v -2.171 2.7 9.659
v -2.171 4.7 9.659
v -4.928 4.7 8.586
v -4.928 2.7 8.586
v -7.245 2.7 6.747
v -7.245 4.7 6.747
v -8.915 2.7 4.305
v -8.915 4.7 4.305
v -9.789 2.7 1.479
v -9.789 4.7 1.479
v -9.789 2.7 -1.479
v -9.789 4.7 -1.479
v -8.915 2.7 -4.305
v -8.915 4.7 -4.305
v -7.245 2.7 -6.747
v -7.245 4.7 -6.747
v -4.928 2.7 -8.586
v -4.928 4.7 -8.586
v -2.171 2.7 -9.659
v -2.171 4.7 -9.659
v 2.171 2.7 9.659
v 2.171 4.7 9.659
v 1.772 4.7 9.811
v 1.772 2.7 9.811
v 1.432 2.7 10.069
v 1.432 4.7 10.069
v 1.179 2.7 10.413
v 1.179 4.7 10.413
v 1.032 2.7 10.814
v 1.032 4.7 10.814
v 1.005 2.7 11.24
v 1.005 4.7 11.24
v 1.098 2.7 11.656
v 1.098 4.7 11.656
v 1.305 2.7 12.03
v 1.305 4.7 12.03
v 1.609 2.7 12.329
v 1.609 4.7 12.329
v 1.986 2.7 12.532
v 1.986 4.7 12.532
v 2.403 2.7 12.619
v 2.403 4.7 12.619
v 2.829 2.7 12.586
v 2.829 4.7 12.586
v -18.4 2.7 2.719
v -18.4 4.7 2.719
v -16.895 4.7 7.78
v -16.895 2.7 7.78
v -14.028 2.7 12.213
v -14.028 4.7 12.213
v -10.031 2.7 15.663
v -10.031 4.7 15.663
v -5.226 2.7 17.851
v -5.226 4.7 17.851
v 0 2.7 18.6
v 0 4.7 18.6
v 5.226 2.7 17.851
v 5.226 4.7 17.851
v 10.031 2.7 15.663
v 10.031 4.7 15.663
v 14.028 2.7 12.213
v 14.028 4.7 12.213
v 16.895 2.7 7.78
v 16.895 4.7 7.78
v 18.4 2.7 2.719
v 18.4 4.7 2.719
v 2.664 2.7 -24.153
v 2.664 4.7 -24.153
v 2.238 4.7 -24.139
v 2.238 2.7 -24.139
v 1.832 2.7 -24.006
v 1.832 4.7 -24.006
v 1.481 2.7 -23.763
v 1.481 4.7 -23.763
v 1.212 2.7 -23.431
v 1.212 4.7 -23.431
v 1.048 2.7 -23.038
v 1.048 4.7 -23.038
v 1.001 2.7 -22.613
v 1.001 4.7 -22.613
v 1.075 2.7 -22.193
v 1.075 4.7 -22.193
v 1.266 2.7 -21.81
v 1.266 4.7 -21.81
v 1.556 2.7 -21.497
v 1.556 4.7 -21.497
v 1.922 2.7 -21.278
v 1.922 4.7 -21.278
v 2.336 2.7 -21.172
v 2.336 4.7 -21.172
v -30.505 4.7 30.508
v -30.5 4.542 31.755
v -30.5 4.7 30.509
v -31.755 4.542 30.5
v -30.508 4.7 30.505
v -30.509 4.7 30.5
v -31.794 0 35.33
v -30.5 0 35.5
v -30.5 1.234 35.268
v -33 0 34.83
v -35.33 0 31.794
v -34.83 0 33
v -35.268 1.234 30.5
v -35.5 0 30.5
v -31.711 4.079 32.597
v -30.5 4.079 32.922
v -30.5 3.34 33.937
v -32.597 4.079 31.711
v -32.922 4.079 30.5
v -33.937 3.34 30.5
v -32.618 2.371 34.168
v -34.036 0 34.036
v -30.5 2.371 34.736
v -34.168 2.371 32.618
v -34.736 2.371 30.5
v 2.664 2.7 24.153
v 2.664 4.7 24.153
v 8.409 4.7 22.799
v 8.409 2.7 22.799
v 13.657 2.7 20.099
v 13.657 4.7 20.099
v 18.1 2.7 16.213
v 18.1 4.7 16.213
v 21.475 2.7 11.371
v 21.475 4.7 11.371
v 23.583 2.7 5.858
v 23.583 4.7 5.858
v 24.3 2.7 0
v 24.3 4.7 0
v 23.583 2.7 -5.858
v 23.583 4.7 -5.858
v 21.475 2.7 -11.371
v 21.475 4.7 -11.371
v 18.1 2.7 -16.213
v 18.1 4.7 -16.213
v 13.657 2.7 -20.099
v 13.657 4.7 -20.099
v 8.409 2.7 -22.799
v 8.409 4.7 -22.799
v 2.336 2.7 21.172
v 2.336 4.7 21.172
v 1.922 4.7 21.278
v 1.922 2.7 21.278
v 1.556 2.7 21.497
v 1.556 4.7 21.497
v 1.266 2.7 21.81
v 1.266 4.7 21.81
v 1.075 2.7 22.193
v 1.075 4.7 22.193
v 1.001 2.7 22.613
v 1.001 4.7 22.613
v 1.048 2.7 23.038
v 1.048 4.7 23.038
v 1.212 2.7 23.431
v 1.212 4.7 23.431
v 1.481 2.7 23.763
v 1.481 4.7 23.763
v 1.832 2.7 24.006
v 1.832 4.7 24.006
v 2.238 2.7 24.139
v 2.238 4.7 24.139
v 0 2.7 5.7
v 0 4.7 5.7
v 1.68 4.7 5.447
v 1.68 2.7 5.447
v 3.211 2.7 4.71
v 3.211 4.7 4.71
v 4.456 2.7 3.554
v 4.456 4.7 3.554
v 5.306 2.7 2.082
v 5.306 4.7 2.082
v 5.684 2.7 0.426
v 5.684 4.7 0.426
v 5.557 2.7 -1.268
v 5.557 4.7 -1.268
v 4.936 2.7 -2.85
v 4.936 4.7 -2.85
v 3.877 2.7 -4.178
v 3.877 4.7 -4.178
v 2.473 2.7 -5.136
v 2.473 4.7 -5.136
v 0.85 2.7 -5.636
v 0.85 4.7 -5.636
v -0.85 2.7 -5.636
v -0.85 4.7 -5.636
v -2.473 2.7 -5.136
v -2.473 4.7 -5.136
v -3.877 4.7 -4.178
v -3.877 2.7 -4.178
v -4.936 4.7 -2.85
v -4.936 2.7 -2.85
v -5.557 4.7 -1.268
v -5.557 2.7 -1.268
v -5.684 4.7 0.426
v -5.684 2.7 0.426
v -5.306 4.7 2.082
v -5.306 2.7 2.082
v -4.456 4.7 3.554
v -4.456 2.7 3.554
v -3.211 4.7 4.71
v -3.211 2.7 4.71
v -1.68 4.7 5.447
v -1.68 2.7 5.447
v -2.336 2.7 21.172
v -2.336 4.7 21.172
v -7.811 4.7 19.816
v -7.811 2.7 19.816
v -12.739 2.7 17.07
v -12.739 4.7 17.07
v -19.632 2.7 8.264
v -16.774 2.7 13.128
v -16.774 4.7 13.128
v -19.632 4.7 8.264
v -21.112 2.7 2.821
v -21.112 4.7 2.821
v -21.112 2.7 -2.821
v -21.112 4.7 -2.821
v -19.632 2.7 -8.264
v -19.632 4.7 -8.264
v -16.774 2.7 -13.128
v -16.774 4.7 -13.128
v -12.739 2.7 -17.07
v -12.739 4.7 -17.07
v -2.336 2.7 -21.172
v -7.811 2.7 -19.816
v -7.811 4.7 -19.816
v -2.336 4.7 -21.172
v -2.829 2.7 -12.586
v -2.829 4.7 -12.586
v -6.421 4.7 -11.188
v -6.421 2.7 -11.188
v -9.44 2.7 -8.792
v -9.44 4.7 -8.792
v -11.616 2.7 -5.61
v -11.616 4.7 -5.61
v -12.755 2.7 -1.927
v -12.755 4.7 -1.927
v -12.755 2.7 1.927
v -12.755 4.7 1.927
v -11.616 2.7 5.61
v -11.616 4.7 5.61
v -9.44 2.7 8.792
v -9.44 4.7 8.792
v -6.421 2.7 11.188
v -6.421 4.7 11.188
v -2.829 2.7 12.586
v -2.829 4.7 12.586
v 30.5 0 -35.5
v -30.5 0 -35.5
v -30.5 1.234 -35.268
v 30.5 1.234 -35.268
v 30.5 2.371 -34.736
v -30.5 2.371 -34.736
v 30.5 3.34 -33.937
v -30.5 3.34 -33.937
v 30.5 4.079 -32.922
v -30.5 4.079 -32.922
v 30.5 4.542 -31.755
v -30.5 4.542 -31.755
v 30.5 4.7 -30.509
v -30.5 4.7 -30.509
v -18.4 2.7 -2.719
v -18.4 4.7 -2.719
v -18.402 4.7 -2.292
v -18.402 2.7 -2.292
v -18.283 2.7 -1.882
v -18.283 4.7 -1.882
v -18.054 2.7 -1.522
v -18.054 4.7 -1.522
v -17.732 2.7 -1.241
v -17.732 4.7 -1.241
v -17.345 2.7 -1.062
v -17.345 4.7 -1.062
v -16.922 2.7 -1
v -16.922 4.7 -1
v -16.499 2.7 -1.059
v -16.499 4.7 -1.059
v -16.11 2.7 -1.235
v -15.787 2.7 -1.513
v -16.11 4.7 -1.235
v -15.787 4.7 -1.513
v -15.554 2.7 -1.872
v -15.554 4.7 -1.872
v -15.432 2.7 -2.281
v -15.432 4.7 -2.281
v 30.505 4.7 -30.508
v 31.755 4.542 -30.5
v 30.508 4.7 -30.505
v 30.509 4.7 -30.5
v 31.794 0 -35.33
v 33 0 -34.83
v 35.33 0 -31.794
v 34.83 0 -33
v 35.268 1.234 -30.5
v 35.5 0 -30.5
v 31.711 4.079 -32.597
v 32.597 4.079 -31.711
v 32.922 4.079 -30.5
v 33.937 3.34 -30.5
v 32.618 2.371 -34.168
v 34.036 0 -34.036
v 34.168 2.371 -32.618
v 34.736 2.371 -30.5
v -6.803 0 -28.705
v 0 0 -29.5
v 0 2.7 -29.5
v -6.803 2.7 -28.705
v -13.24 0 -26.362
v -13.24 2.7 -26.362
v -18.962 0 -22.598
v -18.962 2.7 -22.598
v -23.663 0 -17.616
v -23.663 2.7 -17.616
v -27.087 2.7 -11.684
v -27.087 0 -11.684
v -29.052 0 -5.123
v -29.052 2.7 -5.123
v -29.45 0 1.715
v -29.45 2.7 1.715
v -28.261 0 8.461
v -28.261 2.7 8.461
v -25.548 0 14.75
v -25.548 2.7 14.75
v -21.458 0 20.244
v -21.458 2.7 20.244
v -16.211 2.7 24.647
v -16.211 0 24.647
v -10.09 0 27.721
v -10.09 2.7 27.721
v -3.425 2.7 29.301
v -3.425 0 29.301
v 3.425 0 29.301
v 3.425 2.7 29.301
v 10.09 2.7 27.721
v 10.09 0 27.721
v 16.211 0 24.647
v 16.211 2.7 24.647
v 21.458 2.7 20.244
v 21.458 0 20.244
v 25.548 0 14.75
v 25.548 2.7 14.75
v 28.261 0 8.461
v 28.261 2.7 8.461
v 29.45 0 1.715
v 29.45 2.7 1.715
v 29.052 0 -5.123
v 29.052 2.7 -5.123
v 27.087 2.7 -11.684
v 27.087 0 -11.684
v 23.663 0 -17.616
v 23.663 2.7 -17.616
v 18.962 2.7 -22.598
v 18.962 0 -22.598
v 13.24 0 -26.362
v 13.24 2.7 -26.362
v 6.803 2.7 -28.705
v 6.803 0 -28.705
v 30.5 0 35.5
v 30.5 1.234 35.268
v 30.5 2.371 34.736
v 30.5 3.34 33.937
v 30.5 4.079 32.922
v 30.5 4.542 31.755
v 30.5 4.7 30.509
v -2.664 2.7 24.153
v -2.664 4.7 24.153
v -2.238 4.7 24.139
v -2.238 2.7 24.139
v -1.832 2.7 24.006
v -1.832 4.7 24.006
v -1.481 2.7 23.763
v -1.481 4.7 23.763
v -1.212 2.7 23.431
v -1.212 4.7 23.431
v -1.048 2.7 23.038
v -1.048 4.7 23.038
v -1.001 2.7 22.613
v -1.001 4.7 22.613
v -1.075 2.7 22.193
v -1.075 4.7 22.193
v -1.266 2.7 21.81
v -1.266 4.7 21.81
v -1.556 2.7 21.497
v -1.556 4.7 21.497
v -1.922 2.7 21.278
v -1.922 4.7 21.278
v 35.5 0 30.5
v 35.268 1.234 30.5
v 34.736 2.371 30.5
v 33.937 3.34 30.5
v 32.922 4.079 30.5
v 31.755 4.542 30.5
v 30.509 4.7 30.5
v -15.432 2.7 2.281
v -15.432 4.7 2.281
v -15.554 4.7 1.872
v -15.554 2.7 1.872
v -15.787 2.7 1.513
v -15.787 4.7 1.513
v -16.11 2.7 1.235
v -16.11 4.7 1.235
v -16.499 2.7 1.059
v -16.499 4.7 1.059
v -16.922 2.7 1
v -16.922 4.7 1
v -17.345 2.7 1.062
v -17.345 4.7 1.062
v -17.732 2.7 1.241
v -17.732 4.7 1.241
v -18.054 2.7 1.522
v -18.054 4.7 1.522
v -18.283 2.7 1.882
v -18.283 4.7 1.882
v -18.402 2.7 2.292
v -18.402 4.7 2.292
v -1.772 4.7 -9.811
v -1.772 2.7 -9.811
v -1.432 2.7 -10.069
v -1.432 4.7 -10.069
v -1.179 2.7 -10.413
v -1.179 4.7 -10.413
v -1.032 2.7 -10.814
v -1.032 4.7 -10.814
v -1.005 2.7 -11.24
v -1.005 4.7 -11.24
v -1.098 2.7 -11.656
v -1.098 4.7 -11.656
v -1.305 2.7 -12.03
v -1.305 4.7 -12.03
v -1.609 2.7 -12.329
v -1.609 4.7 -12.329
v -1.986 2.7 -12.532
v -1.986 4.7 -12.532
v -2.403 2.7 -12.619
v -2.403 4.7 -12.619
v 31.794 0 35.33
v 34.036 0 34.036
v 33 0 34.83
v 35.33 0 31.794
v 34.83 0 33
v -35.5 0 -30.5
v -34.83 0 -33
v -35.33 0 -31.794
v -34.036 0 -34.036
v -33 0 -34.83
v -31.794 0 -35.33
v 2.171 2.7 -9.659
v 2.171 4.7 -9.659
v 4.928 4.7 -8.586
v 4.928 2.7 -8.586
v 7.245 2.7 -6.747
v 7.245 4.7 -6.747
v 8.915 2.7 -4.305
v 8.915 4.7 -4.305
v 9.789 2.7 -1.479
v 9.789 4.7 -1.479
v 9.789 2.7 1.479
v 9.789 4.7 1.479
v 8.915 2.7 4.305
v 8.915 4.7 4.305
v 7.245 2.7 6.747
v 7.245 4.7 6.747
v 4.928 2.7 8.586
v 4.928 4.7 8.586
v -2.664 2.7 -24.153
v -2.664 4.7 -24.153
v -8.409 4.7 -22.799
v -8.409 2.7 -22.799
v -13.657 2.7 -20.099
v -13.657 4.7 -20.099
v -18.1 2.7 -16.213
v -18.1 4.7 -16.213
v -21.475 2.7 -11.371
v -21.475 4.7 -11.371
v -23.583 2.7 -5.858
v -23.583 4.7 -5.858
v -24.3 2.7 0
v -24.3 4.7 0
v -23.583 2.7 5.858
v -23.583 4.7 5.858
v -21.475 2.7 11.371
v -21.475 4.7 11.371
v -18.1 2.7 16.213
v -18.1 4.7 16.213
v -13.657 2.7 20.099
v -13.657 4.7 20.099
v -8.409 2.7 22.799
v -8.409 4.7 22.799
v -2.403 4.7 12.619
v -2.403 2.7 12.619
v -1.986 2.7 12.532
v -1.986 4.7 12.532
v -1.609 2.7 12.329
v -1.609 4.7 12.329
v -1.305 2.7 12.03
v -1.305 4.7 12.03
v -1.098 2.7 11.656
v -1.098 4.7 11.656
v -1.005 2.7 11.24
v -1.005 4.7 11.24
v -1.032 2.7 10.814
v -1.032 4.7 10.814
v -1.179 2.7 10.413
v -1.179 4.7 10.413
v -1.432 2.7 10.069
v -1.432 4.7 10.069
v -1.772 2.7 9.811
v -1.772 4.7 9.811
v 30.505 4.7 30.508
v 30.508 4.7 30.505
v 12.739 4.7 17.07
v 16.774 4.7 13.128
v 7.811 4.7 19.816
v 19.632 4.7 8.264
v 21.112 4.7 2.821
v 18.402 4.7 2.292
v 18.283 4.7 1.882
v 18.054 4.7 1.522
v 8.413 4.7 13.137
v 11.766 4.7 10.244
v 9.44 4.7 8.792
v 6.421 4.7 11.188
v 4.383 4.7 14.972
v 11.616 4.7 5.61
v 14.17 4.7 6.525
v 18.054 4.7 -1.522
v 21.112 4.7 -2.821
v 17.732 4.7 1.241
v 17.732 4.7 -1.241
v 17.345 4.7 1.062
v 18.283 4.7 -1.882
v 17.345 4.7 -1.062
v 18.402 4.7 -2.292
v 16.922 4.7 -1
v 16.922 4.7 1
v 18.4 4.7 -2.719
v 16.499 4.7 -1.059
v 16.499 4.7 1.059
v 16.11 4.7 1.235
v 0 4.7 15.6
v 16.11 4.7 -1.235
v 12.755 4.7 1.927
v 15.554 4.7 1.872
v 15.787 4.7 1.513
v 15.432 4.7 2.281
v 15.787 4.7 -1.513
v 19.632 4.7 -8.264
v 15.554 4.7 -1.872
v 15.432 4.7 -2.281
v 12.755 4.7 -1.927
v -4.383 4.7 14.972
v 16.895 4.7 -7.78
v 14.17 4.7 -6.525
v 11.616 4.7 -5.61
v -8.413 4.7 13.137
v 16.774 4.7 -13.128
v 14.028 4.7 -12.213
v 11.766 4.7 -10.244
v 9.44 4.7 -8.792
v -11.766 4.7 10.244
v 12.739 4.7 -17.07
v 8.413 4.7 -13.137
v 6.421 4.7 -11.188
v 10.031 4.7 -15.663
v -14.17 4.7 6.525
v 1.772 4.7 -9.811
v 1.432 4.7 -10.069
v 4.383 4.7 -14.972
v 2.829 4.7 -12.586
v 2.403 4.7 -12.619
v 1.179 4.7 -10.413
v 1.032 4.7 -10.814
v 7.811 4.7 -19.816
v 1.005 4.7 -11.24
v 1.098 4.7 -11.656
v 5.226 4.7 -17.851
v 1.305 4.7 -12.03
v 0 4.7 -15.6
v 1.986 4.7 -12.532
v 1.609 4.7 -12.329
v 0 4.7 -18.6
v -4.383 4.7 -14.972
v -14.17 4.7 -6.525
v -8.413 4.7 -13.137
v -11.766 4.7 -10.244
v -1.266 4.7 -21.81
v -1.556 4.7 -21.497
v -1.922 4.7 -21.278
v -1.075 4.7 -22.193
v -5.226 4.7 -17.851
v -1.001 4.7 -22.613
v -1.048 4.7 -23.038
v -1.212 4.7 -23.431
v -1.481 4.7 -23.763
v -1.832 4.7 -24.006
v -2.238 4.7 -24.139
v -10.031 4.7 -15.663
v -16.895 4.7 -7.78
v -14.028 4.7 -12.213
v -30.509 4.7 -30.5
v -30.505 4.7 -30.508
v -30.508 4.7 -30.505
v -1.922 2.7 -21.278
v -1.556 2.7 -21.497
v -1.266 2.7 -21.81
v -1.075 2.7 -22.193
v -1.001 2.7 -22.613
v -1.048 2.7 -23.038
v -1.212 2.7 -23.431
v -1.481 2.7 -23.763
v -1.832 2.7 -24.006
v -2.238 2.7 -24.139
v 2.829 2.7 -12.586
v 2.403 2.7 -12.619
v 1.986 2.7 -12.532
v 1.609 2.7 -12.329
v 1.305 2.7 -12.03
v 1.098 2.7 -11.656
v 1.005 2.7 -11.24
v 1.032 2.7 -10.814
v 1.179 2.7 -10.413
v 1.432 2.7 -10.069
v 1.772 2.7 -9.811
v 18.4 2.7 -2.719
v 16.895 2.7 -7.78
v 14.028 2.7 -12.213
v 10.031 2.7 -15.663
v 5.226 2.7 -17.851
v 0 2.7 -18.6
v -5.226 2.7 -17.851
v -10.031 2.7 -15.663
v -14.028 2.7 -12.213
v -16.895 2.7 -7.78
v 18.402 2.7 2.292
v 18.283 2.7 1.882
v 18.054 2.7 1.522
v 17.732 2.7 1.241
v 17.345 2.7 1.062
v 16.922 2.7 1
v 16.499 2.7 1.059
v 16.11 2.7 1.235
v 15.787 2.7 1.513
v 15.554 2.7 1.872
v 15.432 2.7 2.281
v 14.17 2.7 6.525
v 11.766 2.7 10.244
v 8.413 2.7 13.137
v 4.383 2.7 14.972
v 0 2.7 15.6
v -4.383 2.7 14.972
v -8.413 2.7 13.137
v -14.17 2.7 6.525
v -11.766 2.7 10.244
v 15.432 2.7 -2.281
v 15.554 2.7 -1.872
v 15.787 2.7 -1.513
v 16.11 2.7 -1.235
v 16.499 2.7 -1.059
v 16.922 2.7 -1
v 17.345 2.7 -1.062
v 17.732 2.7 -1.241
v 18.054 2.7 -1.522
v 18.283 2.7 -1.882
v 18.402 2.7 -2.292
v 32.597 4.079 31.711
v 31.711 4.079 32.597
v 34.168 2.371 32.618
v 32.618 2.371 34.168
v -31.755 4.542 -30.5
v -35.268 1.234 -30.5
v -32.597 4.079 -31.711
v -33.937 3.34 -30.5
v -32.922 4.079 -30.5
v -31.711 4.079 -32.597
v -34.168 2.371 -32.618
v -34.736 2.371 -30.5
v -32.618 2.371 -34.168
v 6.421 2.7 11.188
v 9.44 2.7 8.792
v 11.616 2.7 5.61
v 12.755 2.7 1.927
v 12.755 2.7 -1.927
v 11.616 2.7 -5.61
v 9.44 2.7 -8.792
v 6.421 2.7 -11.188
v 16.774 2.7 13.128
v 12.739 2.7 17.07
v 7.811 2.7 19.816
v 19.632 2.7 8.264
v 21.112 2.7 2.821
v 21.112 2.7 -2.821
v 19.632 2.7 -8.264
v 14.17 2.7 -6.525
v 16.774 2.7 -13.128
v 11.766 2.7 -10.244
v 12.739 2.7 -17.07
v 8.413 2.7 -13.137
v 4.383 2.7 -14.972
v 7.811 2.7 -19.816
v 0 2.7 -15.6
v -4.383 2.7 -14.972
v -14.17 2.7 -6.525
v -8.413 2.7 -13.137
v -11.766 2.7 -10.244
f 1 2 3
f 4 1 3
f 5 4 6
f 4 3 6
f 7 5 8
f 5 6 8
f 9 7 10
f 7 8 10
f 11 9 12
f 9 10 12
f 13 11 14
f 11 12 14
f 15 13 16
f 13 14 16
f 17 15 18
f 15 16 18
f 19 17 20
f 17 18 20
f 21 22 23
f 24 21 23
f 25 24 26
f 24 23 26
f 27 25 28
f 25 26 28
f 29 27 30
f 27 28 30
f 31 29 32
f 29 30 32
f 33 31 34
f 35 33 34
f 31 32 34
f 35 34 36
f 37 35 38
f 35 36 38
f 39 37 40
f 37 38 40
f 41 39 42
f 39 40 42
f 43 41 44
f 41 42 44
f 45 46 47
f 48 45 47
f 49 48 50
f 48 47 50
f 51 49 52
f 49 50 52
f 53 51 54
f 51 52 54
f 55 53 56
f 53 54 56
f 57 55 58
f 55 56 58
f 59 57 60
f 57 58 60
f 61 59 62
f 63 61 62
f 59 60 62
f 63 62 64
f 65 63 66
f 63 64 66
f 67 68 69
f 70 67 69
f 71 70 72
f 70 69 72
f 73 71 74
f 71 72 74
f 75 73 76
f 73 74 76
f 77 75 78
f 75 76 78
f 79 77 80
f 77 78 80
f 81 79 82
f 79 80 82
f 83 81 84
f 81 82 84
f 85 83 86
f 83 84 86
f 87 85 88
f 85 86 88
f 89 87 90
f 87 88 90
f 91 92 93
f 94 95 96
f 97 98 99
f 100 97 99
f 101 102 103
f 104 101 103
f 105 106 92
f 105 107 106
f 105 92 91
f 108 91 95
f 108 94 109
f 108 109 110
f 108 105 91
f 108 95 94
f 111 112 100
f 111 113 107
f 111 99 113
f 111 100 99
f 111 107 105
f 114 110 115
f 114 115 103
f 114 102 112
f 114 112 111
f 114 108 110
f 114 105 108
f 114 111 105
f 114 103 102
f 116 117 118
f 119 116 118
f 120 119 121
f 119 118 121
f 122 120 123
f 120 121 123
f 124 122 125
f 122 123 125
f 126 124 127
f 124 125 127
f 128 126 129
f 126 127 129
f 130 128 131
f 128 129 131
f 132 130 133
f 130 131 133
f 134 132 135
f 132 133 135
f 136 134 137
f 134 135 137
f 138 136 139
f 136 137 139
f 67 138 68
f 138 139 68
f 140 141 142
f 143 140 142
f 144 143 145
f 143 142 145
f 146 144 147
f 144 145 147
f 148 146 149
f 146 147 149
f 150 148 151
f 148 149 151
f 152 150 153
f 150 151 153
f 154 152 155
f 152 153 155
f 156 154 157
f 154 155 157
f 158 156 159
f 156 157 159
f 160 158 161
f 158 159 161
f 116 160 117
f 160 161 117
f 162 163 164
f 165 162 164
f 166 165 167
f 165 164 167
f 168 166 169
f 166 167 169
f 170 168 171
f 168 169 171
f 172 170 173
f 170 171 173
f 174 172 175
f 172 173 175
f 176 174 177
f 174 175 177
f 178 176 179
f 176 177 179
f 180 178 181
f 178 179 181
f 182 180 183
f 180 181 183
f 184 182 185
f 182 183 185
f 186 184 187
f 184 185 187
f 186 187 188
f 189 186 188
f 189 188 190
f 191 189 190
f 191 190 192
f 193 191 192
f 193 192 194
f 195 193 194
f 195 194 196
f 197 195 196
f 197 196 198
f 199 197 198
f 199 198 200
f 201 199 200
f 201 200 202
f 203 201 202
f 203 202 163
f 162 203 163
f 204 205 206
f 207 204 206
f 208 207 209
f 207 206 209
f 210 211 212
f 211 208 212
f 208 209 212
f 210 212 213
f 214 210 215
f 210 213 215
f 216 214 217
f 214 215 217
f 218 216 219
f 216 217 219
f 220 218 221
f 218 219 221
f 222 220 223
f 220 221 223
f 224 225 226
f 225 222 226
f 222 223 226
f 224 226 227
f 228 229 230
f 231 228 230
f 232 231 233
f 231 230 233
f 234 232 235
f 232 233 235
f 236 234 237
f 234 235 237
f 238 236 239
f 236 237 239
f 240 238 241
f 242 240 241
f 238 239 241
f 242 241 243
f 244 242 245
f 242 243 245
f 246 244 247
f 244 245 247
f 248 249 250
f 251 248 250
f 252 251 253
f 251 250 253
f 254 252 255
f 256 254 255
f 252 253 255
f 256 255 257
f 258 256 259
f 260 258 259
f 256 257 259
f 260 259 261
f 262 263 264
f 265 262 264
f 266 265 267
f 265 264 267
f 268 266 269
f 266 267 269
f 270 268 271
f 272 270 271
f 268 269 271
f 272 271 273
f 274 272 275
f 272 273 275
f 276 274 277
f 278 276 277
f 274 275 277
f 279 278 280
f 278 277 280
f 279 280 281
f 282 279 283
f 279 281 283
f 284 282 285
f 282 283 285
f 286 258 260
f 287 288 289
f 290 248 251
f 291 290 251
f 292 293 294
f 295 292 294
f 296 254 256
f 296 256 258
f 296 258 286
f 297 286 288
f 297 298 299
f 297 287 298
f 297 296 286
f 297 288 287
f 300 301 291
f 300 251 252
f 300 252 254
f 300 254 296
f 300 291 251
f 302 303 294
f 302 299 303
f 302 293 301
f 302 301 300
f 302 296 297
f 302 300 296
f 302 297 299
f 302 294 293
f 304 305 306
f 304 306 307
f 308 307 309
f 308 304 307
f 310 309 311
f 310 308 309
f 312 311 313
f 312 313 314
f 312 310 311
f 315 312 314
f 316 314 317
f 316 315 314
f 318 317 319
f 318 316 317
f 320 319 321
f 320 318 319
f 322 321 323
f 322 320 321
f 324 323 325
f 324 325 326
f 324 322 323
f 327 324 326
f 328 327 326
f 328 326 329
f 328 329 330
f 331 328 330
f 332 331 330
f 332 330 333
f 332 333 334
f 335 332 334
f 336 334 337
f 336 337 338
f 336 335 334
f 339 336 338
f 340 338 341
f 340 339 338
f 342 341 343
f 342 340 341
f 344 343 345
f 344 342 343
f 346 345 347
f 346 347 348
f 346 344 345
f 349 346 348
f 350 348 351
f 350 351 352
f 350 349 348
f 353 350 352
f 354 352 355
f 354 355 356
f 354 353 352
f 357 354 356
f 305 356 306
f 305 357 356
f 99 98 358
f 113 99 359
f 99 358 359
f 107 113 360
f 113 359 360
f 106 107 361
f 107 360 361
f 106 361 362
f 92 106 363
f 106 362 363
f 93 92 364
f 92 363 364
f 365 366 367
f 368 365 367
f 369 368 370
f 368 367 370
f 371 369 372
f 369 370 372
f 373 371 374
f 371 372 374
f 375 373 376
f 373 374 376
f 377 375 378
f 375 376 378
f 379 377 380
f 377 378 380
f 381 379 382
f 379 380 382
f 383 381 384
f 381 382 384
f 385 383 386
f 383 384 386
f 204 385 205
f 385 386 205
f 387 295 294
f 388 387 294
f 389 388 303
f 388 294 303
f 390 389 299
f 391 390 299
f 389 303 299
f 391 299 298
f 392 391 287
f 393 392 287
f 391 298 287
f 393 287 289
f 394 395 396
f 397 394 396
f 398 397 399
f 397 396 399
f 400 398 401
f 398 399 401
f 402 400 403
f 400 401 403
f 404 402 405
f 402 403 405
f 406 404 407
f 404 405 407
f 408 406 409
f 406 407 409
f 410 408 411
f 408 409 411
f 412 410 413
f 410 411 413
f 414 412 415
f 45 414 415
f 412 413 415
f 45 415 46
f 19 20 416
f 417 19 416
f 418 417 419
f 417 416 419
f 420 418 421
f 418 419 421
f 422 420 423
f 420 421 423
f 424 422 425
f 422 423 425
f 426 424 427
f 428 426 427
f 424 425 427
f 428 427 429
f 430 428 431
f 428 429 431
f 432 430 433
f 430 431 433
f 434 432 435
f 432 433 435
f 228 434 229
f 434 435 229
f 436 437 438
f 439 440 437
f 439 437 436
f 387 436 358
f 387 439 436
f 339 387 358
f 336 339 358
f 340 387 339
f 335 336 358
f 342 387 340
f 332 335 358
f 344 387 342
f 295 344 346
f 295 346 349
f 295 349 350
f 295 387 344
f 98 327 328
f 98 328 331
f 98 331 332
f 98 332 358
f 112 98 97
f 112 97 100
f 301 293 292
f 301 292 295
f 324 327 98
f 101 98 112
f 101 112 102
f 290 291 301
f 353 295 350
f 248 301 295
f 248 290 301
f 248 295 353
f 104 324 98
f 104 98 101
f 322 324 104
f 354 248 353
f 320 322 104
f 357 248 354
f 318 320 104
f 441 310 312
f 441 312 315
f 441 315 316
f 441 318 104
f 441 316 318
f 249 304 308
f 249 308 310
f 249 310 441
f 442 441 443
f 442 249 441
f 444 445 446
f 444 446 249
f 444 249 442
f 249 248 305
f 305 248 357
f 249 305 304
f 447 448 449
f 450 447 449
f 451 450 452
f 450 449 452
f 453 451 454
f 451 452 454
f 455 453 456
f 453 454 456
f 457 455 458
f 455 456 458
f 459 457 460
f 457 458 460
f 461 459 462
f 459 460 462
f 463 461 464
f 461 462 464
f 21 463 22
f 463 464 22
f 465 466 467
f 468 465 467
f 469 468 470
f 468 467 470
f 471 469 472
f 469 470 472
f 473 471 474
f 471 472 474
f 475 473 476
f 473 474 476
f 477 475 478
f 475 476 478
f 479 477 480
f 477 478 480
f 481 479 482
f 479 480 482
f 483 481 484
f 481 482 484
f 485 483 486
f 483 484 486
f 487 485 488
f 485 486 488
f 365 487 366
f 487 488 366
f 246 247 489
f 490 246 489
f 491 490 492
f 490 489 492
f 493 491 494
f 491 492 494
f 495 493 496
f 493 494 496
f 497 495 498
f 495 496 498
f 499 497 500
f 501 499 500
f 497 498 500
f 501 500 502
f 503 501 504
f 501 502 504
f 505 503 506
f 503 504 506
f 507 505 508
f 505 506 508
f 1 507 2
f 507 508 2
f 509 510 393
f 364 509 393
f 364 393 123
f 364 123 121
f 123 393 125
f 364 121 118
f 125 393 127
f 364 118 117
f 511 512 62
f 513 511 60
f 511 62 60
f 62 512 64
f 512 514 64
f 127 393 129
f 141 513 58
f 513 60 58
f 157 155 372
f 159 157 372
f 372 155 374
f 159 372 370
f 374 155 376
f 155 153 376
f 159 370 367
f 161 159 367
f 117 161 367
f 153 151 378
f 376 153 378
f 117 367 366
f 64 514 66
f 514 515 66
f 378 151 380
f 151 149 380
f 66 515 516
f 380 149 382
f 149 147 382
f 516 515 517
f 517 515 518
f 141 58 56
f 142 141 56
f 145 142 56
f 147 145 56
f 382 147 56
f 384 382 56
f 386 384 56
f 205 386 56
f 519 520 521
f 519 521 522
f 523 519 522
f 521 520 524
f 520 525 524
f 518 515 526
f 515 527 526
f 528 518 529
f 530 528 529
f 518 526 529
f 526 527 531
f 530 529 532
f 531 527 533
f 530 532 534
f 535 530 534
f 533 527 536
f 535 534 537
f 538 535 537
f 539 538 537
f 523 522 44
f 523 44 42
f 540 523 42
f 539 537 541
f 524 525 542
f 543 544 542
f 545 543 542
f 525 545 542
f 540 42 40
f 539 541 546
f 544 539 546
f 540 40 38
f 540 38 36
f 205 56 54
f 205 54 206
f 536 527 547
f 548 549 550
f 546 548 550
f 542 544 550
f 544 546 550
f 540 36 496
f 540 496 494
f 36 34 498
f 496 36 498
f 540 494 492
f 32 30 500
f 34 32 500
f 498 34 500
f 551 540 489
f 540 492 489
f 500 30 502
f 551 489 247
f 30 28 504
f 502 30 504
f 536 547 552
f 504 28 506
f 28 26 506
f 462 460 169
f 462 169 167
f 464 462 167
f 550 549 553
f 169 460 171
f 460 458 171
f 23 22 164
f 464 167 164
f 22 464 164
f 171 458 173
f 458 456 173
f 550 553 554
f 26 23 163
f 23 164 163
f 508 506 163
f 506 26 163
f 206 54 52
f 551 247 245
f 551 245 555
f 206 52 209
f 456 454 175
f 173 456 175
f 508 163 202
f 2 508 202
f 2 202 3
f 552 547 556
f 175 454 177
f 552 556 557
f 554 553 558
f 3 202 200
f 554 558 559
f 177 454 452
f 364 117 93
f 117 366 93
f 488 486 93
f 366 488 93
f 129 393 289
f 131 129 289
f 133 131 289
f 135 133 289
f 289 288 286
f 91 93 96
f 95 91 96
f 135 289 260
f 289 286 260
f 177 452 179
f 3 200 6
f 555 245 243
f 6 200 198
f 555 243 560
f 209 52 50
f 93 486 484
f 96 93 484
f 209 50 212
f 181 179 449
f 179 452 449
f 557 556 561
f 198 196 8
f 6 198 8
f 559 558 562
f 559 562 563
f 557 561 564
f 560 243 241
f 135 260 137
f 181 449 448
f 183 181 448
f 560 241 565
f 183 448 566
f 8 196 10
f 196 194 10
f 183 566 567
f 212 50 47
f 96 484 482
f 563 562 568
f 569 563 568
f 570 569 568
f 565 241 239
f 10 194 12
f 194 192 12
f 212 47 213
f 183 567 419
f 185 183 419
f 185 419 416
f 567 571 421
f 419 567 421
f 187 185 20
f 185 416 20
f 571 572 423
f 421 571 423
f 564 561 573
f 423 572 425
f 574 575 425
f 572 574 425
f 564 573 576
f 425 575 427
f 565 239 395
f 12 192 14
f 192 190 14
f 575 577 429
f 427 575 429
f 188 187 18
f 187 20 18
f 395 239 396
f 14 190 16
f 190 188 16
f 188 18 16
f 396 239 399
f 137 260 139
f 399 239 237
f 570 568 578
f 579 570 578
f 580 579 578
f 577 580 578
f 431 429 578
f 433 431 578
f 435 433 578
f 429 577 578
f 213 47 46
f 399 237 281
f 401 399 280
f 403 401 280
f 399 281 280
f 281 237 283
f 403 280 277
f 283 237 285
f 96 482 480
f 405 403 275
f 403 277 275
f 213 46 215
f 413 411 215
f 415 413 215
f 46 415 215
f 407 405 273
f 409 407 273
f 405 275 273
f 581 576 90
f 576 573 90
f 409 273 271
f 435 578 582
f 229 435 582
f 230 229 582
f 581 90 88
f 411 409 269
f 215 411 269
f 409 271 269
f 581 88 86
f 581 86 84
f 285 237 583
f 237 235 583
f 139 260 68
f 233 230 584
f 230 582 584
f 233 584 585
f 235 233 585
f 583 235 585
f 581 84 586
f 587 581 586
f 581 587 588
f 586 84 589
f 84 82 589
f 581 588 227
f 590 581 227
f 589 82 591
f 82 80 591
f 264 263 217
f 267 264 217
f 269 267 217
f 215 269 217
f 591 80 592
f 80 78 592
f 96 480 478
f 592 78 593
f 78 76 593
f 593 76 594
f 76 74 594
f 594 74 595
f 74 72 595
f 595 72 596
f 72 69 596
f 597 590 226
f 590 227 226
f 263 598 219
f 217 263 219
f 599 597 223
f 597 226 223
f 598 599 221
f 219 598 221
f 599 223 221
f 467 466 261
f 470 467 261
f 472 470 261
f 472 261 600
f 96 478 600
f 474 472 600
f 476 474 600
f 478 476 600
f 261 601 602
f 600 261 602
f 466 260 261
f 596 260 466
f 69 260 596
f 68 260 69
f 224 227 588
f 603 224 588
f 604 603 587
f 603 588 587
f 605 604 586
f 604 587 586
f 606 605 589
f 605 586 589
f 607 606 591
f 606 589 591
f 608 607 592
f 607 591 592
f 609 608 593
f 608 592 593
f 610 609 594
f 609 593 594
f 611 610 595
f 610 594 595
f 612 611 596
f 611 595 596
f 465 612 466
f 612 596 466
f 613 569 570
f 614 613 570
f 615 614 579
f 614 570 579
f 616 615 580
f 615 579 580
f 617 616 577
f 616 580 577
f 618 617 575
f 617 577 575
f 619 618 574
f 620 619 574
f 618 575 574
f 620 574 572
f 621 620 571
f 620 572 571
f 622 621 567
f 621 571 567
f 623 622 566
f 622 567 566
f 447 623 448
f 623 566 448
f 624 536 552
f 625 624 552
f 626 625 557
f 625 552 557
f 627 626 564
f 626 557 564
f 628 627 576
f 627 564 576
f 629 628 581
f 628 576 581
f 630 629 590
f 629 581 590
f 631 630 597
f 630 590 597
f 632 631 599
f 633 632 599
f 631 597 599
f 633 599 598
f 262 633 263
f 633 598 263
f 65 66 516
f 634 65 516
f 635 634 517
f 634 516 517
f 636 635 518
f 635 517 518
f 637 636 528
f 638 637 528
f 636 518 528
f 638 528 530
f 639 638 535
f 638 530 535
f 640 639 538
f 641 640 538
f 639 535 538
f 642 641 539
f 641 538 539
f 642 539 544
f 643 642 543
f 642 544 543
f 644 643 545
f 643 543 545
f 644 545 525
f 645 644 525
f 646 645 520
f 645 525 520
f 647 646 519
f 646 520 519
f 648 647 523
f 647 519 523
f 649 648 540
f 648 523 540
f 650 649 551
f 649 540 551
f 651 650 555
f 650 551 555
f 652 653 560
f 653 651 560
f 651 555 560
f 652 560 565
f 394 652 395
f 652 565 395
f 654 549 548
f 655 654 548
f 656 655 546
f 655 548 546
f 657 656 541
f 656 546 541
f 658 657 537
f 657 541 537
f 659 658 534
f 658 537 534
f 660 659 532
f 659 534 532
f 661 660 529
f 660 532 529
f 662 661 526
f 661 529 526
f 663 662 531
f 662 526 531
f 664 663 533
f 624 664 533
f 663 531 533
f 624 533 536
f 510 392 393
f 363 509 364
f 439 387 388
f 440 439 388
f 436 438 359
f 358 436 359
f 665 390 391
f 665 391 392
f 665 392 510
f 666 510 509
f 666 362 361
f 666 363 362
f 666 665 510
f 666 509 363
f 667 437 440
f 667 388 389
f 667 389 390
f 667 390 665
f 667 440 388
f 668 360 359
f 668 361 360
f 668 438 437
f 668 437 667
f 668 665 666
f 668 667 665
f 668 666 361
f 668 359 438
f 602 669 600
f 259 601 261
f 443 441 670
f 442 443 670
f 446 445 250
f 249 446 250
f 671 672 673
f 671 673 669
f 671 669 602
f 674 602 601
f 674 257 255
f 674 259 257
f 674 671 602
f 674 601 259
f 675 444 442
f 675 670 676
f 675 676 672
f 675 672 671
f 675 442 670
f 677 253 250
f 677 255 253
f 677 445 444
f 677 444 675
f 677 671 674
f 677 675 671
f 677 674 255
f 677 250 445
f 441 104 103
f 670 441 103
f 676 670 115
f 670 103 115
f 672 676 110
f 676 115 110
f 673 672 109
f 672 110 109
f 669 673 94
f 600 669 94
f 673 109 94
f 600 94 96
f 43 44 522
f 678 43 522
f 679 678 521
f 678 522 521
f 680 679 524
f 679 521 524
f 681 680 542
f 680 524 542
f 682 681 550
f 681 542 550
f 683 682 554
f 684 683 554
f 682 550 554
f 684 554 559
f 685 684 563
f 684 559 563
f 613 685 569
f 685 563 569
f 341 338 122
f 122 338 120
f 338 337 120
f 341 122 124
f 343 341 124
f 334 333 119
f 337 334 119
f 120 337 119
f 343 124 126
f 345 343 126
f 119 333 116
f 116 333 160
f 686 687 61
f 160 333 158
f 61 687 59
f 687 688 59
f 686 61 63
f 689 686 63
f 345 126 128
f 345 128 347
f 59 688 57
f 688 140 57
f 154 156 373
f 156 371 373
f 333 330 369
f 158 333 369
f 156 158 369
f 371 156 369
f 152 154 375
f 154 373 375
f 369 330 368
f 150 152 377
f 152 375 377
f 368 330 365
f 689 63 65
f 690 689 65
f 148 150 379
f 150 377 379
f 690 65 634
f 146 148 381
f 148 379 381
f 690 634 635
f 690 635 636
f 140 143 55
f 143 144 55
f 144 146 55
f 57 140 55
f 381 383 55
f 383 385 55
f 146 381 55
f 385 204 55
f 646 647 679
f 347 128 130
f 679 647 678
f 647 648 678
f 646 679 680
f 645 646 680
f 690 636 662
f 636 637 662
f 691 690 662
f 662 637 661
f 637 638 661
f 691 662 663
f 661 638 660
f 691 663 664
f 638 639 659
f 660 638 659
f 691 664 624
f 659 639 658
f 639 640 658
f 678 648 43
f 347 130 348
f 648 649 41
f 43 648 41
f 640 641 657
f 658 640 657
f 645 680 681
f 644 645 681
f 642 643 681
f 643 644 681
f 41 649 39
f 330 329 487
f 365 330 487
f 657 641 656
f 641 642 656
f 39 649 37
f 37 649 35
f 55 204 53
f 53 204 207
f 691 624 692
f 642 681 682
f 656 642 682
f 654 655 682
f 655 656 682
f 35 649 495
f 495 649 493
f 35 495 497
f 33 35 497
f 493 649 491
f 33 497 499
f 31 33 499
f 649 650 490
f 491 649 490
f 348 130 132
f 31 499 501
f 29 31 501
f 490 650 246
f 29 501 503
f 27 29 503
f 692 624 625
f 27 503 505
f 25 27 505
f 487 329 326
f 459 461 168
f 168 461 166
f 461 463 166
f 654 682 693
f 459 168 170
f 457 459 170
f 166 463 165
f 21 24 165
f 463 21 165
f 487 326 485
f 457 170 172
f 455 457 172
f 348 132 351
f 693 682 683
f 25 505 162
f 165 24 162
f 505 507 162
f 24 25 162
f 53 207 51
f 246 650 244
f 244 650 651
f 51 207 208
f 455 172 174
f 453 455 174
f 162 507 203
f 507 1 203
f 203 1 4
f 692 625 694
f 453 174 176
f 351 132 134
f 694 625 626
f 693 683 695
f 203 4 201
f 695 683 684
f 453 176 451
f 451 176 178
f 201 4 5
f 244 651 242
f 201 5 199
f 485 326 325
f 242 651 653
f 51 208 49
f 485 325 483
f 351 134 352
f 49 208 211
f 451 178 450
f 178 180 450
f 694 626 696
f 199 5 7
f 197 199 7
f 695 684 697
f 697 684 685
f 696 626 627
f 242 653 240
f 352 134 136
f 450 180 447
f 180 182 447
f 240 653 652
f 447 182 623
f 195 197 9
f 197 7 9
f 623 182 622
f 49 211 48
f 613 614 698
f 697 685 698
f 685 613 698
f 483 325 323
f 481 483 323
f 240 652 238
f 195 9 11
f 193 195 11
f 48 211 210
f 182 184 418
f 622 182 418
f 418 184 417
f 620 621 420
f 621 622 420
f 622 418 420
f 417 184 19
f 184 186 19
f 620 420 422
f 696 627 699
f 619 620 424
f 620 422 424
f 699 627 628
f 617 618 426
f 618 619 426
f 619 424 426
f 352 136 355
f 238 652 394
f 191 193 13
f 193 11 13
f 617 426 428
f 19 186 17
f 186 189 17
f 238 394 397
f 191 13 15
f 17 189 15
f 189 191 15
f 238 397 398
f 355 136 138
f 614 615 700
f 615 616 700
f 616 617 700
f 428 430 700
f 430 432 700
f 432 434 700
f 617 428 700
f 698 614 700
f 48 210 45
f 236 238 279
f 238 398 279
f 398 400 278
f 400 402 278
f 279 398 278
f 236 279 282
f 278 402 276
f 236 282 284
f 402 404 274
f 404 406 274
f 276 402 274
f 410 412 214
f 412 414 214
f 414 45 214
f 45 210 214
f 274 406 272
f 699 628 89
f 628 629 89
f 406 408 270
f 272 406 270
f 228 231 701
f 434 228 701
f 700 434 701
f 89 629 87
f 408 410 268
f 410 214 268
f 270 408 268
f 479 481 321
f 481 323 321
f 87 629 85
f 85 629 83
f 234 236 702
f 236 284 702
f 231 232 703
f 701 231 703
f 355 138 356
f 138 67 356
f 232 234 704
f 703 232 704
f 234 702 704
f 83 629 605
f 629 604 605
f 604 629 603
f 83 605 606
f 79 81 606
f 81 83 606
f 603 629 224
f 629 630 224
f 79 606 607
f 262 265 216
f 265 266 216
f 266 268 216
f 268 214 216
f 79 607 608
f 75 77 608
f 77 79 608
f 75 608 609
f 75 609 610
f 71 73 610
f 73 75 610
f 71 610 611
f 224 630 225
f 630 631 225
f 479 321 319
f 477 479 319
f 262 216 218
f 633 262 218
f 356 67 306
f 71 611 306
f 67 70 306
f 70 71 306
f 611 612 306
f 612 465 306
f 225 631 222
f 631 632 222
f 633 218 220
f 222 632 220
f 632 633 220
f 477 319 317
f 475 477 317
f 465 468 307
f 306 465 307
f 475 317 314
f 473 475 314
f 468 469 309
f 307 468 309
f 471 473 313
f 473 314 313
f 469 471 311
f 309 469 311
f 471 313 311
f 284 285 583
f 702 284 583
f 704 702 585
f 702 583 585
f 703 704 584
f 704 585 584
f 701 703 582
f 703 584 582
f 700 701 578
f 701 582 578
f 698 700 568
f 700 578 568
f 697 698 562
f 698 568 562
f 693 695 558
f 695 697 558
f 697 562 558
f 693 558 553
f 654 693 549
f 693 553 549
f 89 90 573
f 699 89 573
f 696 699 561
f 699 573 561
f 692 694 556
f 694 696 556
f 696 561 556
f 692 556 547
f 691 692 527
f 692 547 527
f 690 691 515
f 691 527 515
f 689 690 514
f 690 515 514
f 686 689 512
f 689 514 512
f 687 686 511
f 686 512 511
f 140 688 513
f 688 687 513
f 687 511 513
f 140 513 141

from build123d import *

# Parameters (mm, degrees)
EXTRUDE_1_DEPTH     = 4.7
FILLET_1_R          = 5
SKETCH_2_R          = 29.5
CUT_EXTRUDE_1_DEPTH = 2.7
SKETCH_3_R          = 5.7
CUT_EXTRUDE_2_DEPTH = 51.42410138


with BuildPart() as part:
    # Эскиз1 → Бобышка-Вытянуть1 (new body)
    with BuildSketch(Plane(origin=(0, 0, 0), x_dir=(1, 0, 0), z_dir=(0, 1, 0))):
        with BuildLine():
            Line((-30.5, 35.5), (30.5, 35.5))
            ThreePointArc((30.5, 35.5), (34.035533906, 34.035533906), (35.5, 30.5))
            Line((35.5, 30.5), (35.5, -30.5))
            ThreePointArc((35.5, -30.5), (34.035533906, -34.035533906), (30.5, -35.5))
            Line((30.5, -35.5), (-30.5, -35.5))
            ThreePointArc((-30.5, -35.5), (-34.035533906, -34.035533906), (-35.5, -30.5))
            Line((-35.5, -30.5), (-35.5, 30.5))
            ThreePointArc((-35.5, 30.5), (-34.035533906, 34.035533906), (-30.5, 35.5))
        make_face()
    extrude(amount=EXTRUDE_1_DEPTH)

    # Скругление1
    # the kernel refuses this fillet: 5 mm, written as the material it takes off along each edge
    with BuildSketch(Plane(origin=(-30.5, 4.7, 30.5), x_dir=(0, 0, 1), z_dir=(1, 0, 0))) as fillet_1_piece_1:
        with BuildLine():
            CenterArc((0.009008115, 5), FILLET_1_R, 270, 86.560187232)
            Line((0.009008115, 0), (0.009008115, -0.1))
            Line((0.009008115, -0.1), (5, -0.1))
            Line((5, -0.1), (5.1, 0))
            ThreePointArc((5.1, 0), (5.1, 2.35), (5.099819838, 4.694))
            Line((5.099819838, 4.694), (5, 4.7))
        make_face()
    revolve(axis=Axis((-30.5, 4.7, 30.5), (0, -1, 0)), revolution_arc=90, mode=Mode.SUBTRACT)
    with BuildSketch(Plane(origin=(-35.5, 4.7, 30.5), x_dir=(0, -1, 0), z_dir=(0, 0, -1)), Plane(origin=(-30.5, 4.7, -35.5), x_dir=(0, -1, 0), z_dir=(1, 0, 0)), Plane(origin=(35.5, 4.7, -30.5), x_dir=(0, -1, 0), z_dir=(0, 0, 1)), Plane(origin=(30.5, 4.7, 35.5), x_dir=(0, -1, 0), z_dir=(-1, 0, 0))) as fillet_1_piece_2:
        with BuildLine():
            CenterArc((5, -4.990991885), FILLET_1_R, 93.439812768, 86.560187232)
            Line((0, -4.990991885), (-0.1, -4.990991885))
            Line((-0.1, -4.990991885), (-0.1, 0))
            Line((-0.1, 0), (0, 0.1))
            ThreePointArc((0, 0.1), (2.35, 0.1), (4.694, 0.099819838))
            Line((4.694, 0.099819838), (4.7, 0))
        make_face()
    extrude(amount=61, mode=Mode.SUBTRACT)
    with BuildSketch(Plane(origin=(-30.5, 4.7, -30.5), x_dir=(-1, 0, 0), z_dir=(0, 0, 1))) as fillet_1_piece_3:
        with BuildLine():
            CenterArc((0.009008115, 5), FILLET_1_R, 270, 86.560187232)
            Line((0.009008115, 0), (0.009008115, -0.1))
            Line((0.009008115, -0.1), (5, -0.1))
            Line((5, -0.1), (5.1, 0))
            ThreePointArc((5.1, 0), (5.1, 2.35), (5.099819838, 4.694))
            Line((5.099819838, 4.694), (5, 4.7))
        make_face()
    revolve(axis=Axis((-30.5, 4.7, -30.5), (0, -1, 0)), revolution_arc=90, mode=Mode.SUBTRACT)
    with BuildSketch(Plane(origin=(30.5, 4.7, -30.5), x_dir=(0, 0, -1), z_dir=(-1, 0, 0))) as fillet_1_piece_4:
        with BuildLine():
            CenterArc((0.009008115, 5), FILLET_1_R, 270, 86.560187232)
            Line((0.009008115, 0), (0.009008115, -0.1))
            Line((0.009008115, -0.1), (5, -0.1))
            Line((5, -0.1), (5.1, 0))
            ThreePointArc((5.1, 0), (5.1, 2.35), (5.099819838, 4.694))
            Line((5.099819838, 4.694), (5, 4.7))
        make_face()
    revolve(axis=Axis((30.5, 4.7, -30.5), (0, -1, 0)), revolution_arc=90, mode=Mode.SUBTRACT)
    with BuildSketch(Plane(origin=(30.5, 4.7, 30.5), x_dir=(1, 0, 0), z_dir=(0, 0, -1))) as fillet_1_piece_5:
        with BuildLine():
            CenterArc((0.009008115, 5), FILLET_1_R, 270, 86.560187232)
            Line((0.009008115, 0), (0.009008115, -0.1))
            Line((0.009008115, -0.1), (5, -0.1))
            Line((5, -0.1), (5.1, 0))
            ThreePointArc((5.1, 0), (5.1, 2.35), (5.099819838, 4.694))
            Line((5.099819838, 4.694), (5, 4.7))
        make_face()
    revolve(axis=Axis((30.5, 4.7, 30.5), (0, -1, 0)), revolution_arc=90, mode=Mode.SUBTRACT)

    # Эскиз2 → Вырез-Вытянуть1 (cut)
    with BuildSketch(Plane(origin=(0, 0, 0), x_dir=(1, 0, 0), z_dir=(0, 1, 0))):
        with Locations(Location((0, 0, 0), (0, 0, 90))):
            Circle(SKETCH_2_R)
    extrude(amount=CUT_EXTRUDE_1_DEPTH, mode=Mode.SUBTRACT)

    # Эскиз3 → Вырез-Вытянуть2 (cut, through all)
    with BuildSketch(Plane(origin=(0, 4.7, 0), x_dir=(1, 0, 0), z_dir=(0, 1, 0))):
        with Locations(Location((0, 0, 0), (0, 0, 270))):
            Circle(SKETCH_3_R)
        with BuildLine():
            ThreePointArc((2.828947368, -12.585986524), (12.9, 0), (2.828947368, 12.585986524))
            ThreePointArc((2.828947368, 12.585986524), (1.036513195, 11.451447087), (2.171052632, 9.659012914))
            ThreePointArc((2.171052632, 9.659012914), (9.9, 0), (2.171052632, -9.659012914))
            ThreePointArc((2.171052632, -9.659012914), (1.036513195, -11.451447087), (2.828947368, -12.585986524))
        make_face()
        with BuildLine():
            ThreePointArc((-2.828947368, 12.585986524), (-12.9, 0), (-2.828947368, -12.585986524))
            ThreePointArc((-2.828947368, -12.585986524), (-1.036513195, -11.451447087), (-2.171052632, -9.659012914))
            ThreePointArc((-2.171052632, -9.659012914), (-9.9, 0), (-2.171052632, 9.659012914))
            ThreePointArc((-2.171052632, 9.659012914), (-1.036513195, 11.451447087), (-2.828947368, 12.585986524))
        make_face()
        with BuildLine():
            ThreePointArc((18.400147202, 2.719298246), (0, 18.6), (-18.400147202, 2.719298246))
            ThreePointArc((-18.400147202, 2.719298246), (-17.135562609, 1.016117161), (-15.432381524, 2.280701754))
            ThreePointArc((-15.432381524, 2.280701754), (0, 15.6), (15.432381524, 2.280701754))
            ThreePointArc((15.432381524, 2.280701754), (17.135562609, 1.016117161), (18.400147202, 2.719298246))
        make_face()
        with BuildLine():
            ThreePointArc((-18.400147202, -2.719298246), (0, -18.6), (18.400147202, -2.719298246))
            ThreePointArc((18.400147202, -2.719298246), (17.135562609, -1.016117161), (15.432381524, -2.280701754))
            ThreePointArc((15.432381524, -2.280701754), (0, -15.6), (-15.432381524, -2.280701754))
            ThreePointArc((-15.432381524, -2.280701754), (-17.135562609, -1.016117161), (-18.400147202, -2.719298246))
        make_face()
        with BuildLine():
            ThreePointArc((-2.664473684, 24.153479666), (-24.3, 0), (-2.664473684, -24.153479666))
            ThreePointArc((-2.664473684, -24.153479666), (-1.009044465, -22.826997815), (-2.335526316, -21.171568596))
            ThreePointArc((-2.335526316, -21.171568596), (-21.3, 0), (-2.335526316, 21.171568596))
            ThreePointArc((-2.335526316, 21.171568596), (-1.009044465, 22.826997815), (-2.664473684, 24.153479666))
        make_face()
        with BuildLine():
            ThreePointArc((2.664473684, -24.153479666), (24.3, 0), (2.664473684, 24.153479666))
            ThreePointArc((2.664473684, 24.153479666), (1.009044465, 22.826997815), (2.335526316, 21.171568596))
            ThreePointArc((2.335526316, 21.171568596), (21.3, 0), (2.335526316, -21.171568596))
            ThreePointArc((2.335526316, -21.171568596), (1.009044465, -22.826997815), (2.664473684, -24.153479666))
        make_face()
    extrude(amount=-CUT_EXTRUDE_2_DEPTH, mode=Mode.SUBTRACT)


solid = part.part
